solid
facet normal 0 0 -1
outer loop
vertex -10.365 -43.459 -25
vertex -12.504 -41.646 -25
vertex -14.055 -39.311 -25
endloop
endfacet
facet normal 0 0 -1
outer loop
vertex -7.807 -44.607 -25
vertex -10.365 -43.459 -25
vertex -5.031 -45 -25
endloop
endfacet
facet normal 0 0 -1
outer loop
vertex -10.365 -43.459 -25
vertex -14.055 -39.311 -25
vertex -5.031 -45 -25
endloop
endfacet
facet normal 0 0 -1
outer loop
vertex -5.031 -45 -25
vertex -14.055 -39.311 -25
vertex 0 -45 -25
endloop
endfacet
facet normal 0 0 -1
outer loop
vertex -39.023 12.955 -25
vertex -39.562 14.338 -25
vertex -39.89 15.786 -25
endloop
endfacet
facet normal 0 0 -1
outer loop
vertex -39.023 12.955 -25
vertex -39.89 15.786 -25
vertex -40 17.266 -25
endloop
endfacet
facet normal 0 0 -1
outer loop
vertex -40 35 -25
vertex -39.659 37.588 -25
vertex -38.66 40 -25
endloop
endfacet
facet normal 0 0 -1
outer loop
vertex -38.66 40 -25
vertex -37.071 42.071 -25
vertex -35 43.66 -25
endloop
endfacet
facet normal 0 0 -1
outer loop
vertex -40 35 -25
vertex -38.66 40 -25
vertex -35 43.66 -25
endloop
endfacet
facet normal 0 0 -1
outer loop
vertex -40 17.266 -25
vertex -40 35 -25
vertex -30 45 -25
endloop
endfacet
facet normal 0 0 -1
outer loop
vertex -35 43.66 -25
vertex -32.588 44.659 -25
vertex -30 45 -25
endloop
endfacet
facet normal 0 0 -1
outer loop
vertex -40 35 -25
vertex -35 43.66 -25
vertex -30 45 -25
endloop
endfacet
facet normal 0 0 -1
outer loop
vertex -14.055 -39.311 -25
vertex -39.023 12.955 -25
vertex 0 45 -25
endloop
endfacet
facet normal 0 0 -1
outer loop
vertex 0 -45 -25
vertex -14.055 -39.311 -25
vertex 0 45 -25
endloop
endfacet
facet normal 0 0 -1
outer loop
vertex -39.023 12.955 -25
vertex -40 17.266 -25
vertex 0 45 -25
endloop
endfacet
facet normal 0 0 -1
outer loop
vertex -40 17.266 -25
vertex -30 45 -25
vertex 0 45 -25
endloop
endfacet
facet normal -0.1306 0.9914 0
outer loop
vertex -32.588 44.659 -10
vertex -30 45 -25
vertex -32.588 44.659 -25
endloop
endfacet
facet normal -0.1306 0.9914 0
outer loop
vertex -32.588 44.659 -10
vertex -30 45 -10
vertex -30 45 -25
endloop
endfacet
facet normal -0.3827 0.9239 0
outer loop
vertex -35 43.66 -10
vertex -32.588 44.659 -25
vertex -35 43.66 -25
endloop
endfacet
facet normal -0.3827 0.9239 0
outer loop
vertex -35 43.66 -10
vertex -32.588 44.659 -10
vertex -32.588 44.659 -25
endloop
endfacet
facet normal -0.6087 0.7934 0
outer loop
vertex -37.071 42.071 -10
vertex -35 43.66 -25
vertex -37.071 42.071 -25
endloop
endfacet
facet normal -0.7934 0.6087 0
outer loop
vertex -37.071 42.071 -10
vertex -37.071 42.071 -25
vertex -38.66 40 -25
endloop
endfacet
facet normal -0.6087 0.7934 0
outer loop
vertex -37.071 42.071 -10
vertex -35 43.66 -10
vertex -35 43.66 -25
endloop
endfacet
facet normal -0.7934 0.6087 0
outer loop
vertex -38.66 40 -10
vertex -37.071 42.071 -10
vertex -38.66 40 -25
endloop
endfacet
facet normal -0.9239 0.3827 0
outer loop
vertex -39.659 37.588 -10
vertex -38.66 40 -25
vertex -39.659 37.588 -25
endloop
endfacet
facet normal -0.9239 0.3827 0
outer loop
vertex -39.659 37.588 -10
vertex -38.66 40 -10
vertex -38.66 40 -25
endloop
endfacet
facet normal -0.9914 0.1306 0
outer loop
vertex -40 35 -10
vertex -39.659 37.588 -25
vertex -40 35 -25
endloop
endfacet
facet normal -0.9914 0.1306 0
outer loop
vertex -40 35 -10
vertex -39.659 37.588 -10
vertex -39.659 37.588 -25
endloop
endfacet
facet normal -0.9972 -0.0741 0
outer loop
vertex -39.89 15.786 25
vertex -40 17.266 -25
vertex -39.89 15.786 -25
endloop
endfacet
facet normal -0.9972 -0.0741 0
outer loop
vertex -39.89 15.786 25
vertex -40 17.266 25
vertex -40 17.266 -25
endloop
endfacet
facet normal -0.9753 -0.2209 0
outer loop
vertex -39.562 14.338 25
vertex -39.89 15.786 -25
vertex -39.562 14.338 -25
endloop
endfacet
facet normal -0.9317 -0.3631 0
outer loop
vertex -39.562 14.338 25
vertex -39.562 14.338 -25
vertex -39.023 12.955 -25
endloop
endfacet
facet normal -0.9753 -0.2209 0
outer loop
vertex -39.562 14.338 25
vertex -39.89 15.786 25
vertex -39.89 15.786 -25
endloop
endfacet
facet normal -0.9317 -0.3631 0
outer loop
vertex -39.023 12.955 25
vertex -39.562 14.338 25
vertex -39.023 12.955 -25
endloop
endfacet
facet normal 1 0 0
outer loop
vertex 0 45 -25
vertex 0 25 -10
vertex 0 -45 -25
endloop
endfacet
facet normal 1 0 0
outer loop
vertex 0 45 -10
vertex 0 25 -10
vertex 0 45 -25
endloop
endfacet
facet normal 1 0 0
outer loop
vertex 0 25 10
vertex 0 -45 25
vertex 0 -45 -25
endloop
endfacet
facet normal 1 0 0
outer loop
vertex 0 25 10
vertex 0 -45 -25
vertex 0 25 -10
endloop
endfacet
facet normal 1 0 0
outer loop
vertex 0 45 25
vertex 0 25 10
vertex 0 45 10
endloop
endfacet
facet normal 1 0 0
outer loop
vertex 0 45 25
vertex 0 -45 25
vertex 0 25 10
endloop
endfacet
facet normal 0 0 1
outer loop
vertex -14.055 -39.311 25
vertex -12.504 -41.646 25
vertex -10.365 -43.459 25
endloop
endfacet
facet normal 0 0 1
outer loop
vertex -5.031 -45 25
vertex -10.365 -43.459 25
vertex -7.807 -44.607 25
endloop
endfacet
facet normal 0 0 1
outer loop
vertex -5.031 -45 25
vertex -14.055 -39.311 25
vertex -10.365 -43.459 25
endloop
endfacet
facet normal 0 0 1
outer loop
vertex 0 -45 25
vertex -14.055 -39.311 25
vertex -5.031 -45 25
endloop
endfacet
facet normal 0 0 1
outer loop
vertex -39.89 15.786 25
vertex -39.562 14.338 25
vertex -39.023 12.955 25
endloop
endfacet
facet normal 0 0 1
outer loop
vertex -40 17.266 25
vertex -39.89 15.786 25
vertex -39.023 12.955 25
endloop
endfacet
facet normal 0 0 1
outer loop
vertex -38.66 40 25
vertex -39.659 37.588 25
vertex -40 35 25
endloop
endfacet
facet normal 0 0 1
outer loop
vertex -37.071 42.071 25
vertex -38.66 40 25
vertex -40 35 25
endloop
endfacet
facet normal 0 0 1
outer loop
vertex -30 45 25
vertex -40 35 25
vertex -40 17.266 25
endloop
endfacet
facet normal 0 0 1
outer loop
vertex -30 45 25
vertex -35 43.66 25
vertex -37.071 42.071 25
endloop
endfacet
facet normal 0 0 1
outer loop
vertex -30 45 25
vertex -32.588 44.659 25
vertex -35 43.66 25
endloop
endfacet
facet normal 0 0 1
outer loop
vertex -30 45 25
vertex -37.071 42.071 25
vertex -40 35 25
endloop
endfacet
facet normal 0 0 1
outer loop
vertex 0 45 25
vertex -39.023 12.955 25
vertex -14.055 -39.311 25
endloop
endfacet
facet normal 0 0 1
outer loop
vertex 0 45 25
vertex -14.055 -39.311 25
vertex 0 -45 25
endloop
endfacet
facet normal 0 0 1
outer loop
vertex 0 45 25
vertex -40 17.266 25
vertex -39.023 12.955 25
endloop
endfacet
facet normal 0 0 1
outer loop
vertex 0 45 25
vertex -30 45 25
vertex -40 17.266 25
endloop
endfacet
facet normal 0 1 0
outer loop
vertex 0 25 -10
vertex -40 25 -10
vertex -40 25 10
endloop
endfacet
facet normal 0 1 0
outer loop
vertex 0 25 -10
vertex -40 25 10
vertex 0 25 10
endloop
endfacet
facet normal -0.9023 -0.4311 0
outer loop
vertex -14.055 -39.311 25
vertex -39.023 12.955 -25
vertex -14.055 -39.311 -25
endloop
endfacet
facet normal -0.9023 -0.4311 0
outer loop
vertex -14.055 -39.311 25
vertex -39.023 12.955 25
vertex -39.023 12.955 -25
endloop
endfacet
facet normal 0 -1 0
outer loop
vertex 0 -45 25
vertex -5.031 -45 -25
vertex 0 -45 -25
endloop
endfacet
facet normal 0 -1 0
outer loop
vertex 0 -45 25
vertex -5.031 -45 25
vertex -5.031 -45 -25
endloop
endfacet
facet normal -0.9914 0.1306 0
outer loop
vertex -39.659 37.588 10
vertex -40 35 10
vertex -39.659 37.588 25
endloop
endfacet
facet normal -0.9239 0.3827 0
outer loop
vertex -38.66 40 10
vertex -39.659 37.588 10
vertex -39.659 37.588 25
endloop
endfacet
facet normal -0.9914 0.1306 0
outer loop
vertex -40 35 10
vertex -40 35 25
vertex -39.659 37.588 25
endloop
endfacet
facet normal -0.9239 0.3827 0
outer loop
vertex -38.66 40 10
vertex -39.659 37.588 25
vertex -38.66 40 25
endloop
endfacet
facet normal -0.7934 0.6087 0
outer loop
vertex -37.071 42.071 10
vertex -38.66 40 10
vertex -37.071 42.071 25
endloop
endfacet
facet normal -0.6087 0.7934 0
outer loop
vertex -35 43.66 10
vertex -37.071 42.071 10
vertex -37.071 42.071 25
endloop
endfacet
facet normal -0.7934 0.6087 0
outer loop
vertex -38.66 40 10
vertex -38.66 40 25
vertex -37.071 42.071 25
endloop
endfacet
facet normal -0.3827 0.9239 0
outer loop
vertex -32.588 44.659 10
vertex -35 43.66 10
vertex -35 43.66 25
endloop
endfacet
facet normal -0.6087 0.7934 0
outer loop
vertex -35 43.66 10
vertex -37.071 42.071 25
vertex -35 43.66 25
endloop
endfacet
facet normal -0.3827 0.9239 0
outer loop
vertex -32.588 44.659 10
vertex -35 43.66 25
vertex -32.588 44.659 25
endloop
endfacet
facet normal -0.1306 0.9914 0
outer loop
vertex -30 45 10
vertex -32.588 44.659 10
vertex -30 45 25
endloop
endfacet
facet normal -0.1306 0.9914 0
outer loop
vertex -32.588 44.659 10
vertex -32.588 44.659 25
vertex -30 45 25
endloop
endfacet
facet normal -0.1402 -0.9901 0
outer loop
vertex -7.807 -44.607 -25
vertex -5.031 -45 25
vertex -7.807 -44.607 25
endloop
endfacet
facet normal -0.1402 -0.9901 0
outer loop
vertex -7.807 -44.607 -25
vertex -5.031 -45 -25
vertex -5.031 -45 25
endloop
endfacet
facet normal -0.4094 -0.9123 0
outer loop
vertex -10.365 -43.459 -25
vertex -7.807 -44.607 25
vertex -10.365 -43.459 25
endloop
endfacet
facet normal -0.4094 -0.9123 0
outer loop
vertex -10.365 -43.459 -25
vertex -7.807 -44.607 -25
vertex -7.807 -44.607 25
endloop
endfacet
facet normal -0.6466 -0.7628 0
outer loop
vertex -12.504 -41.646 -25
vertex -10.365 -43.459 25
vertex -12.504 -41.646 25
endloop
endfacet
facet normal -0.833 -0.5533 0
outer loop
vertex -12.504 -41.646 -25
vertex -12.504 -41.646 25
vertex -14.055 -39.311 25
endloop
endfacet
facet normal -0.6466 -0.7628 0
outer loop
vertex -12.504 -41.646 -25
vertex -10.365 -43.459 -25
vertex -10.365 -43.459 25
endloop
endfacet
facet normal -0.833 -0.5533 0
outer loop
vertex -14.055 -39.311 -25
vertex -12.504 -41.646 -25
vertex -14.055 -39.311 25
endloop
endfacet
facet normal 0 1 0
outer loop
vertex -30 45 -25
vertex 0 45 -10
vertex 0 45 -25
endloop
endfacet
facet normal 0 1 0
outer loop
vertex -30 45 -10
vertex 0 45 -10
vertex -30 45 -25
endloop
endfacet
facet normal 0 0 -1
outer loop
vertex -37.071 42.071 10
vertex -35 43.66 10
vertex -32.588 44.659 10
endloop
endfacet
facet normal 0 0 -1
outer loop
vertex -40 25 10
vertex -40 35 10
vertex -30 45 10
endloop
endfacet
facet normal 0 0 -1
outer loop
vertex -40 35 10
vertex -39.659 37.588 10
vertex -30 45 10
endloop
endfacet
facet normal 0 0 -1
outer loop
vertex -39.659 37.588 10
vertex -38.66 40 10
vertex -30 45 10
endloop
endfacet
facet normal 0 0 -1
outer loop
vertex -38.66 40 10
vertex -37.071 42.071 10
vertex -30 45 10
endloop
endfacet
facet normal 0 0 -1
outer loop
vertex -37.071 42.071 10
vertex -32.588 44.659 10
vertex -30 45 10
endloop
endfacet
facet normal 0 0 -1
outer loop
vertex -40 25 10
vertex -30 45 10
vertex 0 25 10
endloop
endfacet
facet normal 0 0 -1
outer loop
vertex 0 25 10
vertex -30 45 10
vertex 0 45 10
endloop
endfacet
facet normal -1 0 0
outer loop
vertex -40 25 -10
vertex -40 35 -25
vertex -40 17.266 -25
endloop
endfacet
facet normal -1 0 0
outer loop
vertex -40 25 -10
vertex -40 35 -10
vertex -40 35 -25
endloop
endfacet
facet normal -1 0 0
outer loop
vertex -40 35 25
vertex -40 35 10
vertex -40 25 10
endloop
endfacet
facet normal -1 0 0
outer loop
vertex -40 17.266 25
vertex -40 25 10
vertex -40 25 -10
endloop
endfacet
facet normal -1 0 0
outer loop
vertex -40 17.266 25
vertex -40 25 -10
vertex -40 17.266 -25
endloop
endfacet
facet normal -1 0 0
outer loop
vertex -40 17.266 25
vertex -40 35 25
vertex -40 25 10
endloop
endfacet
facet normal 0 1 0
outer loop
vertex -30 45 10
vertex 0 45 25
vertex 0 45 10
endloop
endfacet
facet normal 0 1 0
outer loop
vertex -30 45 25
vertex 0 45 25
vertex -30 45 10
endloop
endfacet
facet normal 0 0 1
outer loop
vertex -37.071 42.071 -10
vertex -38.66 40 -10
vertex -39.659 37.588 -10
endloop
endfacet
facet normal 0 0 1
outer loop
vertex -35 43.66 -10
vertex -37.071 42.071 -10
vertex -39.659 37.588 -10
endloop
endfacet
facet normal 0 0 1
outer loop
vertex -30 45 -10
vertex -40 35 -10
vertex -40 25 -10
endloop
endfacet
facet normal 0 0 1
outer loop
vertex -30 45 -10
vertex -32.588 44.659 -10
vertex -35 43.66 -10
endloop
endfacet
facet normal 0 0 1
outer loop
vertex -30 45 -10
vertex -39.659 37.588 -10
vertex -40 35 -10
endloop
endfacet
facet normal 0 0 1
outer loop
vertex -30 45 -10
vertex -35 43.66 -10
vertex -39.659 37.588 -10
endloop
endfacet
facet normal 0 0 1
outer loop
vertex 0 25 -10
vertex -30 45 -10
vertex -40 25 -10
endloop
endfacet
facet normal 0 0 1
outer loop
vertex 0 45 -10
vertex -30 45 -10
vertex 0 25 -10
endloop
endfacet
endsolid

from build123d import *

# Parameters (mm, degrees)
BOSS_EXTRUDE1_DEPTH = 25
SKETCH2_W           = 40
SKETCH2_H           = 20
CUT_EXTRUDE1_DEPTH  = 20
FILLET1_R           = 10
FILLET2_R           = 10


with BuildPart() as part:
    # Sketch1 → Boss-Extrude1 (new, symmetric)
    with BuildSketch(Plane.XY):
        Polygon((0, 45), (-40, 45), (-40, 15), (-11.336760925, -45), (0, -45), align=None)
    extrude(amount=BOSS_EXTRUDE1_DEPTH, both=True)

    # Sketch2 → Cut-Extrude1 (cut)
    with BuildSketch(Plane(origin=(0, 45, 0), x_dir=(1, 0, 0), z_dir=(0, 1, 0))):
        with Locations((-20, 0)):
            Rectangle(SKETCH2_W, SKETCH2_H)
    extrude(amount=-CUT_EXTRUDE1_DEPTH, mode=Mode.SUBTRACT)

    # Fillet1
    fillet1_edges = [part.edges().sort_by_distance(p)[0] for p in [
        (-40, 45, -17.5),
        (-40, 45, 17.5),
    ]]
    fillet(fillet1_edges, radius=FILLET1_R)

    # Fillet2
    fillet2_edges = [part.edges().sort_by_distance(p)[0] for p in [
        (-11.336760925, -45, 0),
        (-40, 15, 0),
    ]]
    fillet(fillet2_edges, radius=FILLET2_R)


solid = part.part
